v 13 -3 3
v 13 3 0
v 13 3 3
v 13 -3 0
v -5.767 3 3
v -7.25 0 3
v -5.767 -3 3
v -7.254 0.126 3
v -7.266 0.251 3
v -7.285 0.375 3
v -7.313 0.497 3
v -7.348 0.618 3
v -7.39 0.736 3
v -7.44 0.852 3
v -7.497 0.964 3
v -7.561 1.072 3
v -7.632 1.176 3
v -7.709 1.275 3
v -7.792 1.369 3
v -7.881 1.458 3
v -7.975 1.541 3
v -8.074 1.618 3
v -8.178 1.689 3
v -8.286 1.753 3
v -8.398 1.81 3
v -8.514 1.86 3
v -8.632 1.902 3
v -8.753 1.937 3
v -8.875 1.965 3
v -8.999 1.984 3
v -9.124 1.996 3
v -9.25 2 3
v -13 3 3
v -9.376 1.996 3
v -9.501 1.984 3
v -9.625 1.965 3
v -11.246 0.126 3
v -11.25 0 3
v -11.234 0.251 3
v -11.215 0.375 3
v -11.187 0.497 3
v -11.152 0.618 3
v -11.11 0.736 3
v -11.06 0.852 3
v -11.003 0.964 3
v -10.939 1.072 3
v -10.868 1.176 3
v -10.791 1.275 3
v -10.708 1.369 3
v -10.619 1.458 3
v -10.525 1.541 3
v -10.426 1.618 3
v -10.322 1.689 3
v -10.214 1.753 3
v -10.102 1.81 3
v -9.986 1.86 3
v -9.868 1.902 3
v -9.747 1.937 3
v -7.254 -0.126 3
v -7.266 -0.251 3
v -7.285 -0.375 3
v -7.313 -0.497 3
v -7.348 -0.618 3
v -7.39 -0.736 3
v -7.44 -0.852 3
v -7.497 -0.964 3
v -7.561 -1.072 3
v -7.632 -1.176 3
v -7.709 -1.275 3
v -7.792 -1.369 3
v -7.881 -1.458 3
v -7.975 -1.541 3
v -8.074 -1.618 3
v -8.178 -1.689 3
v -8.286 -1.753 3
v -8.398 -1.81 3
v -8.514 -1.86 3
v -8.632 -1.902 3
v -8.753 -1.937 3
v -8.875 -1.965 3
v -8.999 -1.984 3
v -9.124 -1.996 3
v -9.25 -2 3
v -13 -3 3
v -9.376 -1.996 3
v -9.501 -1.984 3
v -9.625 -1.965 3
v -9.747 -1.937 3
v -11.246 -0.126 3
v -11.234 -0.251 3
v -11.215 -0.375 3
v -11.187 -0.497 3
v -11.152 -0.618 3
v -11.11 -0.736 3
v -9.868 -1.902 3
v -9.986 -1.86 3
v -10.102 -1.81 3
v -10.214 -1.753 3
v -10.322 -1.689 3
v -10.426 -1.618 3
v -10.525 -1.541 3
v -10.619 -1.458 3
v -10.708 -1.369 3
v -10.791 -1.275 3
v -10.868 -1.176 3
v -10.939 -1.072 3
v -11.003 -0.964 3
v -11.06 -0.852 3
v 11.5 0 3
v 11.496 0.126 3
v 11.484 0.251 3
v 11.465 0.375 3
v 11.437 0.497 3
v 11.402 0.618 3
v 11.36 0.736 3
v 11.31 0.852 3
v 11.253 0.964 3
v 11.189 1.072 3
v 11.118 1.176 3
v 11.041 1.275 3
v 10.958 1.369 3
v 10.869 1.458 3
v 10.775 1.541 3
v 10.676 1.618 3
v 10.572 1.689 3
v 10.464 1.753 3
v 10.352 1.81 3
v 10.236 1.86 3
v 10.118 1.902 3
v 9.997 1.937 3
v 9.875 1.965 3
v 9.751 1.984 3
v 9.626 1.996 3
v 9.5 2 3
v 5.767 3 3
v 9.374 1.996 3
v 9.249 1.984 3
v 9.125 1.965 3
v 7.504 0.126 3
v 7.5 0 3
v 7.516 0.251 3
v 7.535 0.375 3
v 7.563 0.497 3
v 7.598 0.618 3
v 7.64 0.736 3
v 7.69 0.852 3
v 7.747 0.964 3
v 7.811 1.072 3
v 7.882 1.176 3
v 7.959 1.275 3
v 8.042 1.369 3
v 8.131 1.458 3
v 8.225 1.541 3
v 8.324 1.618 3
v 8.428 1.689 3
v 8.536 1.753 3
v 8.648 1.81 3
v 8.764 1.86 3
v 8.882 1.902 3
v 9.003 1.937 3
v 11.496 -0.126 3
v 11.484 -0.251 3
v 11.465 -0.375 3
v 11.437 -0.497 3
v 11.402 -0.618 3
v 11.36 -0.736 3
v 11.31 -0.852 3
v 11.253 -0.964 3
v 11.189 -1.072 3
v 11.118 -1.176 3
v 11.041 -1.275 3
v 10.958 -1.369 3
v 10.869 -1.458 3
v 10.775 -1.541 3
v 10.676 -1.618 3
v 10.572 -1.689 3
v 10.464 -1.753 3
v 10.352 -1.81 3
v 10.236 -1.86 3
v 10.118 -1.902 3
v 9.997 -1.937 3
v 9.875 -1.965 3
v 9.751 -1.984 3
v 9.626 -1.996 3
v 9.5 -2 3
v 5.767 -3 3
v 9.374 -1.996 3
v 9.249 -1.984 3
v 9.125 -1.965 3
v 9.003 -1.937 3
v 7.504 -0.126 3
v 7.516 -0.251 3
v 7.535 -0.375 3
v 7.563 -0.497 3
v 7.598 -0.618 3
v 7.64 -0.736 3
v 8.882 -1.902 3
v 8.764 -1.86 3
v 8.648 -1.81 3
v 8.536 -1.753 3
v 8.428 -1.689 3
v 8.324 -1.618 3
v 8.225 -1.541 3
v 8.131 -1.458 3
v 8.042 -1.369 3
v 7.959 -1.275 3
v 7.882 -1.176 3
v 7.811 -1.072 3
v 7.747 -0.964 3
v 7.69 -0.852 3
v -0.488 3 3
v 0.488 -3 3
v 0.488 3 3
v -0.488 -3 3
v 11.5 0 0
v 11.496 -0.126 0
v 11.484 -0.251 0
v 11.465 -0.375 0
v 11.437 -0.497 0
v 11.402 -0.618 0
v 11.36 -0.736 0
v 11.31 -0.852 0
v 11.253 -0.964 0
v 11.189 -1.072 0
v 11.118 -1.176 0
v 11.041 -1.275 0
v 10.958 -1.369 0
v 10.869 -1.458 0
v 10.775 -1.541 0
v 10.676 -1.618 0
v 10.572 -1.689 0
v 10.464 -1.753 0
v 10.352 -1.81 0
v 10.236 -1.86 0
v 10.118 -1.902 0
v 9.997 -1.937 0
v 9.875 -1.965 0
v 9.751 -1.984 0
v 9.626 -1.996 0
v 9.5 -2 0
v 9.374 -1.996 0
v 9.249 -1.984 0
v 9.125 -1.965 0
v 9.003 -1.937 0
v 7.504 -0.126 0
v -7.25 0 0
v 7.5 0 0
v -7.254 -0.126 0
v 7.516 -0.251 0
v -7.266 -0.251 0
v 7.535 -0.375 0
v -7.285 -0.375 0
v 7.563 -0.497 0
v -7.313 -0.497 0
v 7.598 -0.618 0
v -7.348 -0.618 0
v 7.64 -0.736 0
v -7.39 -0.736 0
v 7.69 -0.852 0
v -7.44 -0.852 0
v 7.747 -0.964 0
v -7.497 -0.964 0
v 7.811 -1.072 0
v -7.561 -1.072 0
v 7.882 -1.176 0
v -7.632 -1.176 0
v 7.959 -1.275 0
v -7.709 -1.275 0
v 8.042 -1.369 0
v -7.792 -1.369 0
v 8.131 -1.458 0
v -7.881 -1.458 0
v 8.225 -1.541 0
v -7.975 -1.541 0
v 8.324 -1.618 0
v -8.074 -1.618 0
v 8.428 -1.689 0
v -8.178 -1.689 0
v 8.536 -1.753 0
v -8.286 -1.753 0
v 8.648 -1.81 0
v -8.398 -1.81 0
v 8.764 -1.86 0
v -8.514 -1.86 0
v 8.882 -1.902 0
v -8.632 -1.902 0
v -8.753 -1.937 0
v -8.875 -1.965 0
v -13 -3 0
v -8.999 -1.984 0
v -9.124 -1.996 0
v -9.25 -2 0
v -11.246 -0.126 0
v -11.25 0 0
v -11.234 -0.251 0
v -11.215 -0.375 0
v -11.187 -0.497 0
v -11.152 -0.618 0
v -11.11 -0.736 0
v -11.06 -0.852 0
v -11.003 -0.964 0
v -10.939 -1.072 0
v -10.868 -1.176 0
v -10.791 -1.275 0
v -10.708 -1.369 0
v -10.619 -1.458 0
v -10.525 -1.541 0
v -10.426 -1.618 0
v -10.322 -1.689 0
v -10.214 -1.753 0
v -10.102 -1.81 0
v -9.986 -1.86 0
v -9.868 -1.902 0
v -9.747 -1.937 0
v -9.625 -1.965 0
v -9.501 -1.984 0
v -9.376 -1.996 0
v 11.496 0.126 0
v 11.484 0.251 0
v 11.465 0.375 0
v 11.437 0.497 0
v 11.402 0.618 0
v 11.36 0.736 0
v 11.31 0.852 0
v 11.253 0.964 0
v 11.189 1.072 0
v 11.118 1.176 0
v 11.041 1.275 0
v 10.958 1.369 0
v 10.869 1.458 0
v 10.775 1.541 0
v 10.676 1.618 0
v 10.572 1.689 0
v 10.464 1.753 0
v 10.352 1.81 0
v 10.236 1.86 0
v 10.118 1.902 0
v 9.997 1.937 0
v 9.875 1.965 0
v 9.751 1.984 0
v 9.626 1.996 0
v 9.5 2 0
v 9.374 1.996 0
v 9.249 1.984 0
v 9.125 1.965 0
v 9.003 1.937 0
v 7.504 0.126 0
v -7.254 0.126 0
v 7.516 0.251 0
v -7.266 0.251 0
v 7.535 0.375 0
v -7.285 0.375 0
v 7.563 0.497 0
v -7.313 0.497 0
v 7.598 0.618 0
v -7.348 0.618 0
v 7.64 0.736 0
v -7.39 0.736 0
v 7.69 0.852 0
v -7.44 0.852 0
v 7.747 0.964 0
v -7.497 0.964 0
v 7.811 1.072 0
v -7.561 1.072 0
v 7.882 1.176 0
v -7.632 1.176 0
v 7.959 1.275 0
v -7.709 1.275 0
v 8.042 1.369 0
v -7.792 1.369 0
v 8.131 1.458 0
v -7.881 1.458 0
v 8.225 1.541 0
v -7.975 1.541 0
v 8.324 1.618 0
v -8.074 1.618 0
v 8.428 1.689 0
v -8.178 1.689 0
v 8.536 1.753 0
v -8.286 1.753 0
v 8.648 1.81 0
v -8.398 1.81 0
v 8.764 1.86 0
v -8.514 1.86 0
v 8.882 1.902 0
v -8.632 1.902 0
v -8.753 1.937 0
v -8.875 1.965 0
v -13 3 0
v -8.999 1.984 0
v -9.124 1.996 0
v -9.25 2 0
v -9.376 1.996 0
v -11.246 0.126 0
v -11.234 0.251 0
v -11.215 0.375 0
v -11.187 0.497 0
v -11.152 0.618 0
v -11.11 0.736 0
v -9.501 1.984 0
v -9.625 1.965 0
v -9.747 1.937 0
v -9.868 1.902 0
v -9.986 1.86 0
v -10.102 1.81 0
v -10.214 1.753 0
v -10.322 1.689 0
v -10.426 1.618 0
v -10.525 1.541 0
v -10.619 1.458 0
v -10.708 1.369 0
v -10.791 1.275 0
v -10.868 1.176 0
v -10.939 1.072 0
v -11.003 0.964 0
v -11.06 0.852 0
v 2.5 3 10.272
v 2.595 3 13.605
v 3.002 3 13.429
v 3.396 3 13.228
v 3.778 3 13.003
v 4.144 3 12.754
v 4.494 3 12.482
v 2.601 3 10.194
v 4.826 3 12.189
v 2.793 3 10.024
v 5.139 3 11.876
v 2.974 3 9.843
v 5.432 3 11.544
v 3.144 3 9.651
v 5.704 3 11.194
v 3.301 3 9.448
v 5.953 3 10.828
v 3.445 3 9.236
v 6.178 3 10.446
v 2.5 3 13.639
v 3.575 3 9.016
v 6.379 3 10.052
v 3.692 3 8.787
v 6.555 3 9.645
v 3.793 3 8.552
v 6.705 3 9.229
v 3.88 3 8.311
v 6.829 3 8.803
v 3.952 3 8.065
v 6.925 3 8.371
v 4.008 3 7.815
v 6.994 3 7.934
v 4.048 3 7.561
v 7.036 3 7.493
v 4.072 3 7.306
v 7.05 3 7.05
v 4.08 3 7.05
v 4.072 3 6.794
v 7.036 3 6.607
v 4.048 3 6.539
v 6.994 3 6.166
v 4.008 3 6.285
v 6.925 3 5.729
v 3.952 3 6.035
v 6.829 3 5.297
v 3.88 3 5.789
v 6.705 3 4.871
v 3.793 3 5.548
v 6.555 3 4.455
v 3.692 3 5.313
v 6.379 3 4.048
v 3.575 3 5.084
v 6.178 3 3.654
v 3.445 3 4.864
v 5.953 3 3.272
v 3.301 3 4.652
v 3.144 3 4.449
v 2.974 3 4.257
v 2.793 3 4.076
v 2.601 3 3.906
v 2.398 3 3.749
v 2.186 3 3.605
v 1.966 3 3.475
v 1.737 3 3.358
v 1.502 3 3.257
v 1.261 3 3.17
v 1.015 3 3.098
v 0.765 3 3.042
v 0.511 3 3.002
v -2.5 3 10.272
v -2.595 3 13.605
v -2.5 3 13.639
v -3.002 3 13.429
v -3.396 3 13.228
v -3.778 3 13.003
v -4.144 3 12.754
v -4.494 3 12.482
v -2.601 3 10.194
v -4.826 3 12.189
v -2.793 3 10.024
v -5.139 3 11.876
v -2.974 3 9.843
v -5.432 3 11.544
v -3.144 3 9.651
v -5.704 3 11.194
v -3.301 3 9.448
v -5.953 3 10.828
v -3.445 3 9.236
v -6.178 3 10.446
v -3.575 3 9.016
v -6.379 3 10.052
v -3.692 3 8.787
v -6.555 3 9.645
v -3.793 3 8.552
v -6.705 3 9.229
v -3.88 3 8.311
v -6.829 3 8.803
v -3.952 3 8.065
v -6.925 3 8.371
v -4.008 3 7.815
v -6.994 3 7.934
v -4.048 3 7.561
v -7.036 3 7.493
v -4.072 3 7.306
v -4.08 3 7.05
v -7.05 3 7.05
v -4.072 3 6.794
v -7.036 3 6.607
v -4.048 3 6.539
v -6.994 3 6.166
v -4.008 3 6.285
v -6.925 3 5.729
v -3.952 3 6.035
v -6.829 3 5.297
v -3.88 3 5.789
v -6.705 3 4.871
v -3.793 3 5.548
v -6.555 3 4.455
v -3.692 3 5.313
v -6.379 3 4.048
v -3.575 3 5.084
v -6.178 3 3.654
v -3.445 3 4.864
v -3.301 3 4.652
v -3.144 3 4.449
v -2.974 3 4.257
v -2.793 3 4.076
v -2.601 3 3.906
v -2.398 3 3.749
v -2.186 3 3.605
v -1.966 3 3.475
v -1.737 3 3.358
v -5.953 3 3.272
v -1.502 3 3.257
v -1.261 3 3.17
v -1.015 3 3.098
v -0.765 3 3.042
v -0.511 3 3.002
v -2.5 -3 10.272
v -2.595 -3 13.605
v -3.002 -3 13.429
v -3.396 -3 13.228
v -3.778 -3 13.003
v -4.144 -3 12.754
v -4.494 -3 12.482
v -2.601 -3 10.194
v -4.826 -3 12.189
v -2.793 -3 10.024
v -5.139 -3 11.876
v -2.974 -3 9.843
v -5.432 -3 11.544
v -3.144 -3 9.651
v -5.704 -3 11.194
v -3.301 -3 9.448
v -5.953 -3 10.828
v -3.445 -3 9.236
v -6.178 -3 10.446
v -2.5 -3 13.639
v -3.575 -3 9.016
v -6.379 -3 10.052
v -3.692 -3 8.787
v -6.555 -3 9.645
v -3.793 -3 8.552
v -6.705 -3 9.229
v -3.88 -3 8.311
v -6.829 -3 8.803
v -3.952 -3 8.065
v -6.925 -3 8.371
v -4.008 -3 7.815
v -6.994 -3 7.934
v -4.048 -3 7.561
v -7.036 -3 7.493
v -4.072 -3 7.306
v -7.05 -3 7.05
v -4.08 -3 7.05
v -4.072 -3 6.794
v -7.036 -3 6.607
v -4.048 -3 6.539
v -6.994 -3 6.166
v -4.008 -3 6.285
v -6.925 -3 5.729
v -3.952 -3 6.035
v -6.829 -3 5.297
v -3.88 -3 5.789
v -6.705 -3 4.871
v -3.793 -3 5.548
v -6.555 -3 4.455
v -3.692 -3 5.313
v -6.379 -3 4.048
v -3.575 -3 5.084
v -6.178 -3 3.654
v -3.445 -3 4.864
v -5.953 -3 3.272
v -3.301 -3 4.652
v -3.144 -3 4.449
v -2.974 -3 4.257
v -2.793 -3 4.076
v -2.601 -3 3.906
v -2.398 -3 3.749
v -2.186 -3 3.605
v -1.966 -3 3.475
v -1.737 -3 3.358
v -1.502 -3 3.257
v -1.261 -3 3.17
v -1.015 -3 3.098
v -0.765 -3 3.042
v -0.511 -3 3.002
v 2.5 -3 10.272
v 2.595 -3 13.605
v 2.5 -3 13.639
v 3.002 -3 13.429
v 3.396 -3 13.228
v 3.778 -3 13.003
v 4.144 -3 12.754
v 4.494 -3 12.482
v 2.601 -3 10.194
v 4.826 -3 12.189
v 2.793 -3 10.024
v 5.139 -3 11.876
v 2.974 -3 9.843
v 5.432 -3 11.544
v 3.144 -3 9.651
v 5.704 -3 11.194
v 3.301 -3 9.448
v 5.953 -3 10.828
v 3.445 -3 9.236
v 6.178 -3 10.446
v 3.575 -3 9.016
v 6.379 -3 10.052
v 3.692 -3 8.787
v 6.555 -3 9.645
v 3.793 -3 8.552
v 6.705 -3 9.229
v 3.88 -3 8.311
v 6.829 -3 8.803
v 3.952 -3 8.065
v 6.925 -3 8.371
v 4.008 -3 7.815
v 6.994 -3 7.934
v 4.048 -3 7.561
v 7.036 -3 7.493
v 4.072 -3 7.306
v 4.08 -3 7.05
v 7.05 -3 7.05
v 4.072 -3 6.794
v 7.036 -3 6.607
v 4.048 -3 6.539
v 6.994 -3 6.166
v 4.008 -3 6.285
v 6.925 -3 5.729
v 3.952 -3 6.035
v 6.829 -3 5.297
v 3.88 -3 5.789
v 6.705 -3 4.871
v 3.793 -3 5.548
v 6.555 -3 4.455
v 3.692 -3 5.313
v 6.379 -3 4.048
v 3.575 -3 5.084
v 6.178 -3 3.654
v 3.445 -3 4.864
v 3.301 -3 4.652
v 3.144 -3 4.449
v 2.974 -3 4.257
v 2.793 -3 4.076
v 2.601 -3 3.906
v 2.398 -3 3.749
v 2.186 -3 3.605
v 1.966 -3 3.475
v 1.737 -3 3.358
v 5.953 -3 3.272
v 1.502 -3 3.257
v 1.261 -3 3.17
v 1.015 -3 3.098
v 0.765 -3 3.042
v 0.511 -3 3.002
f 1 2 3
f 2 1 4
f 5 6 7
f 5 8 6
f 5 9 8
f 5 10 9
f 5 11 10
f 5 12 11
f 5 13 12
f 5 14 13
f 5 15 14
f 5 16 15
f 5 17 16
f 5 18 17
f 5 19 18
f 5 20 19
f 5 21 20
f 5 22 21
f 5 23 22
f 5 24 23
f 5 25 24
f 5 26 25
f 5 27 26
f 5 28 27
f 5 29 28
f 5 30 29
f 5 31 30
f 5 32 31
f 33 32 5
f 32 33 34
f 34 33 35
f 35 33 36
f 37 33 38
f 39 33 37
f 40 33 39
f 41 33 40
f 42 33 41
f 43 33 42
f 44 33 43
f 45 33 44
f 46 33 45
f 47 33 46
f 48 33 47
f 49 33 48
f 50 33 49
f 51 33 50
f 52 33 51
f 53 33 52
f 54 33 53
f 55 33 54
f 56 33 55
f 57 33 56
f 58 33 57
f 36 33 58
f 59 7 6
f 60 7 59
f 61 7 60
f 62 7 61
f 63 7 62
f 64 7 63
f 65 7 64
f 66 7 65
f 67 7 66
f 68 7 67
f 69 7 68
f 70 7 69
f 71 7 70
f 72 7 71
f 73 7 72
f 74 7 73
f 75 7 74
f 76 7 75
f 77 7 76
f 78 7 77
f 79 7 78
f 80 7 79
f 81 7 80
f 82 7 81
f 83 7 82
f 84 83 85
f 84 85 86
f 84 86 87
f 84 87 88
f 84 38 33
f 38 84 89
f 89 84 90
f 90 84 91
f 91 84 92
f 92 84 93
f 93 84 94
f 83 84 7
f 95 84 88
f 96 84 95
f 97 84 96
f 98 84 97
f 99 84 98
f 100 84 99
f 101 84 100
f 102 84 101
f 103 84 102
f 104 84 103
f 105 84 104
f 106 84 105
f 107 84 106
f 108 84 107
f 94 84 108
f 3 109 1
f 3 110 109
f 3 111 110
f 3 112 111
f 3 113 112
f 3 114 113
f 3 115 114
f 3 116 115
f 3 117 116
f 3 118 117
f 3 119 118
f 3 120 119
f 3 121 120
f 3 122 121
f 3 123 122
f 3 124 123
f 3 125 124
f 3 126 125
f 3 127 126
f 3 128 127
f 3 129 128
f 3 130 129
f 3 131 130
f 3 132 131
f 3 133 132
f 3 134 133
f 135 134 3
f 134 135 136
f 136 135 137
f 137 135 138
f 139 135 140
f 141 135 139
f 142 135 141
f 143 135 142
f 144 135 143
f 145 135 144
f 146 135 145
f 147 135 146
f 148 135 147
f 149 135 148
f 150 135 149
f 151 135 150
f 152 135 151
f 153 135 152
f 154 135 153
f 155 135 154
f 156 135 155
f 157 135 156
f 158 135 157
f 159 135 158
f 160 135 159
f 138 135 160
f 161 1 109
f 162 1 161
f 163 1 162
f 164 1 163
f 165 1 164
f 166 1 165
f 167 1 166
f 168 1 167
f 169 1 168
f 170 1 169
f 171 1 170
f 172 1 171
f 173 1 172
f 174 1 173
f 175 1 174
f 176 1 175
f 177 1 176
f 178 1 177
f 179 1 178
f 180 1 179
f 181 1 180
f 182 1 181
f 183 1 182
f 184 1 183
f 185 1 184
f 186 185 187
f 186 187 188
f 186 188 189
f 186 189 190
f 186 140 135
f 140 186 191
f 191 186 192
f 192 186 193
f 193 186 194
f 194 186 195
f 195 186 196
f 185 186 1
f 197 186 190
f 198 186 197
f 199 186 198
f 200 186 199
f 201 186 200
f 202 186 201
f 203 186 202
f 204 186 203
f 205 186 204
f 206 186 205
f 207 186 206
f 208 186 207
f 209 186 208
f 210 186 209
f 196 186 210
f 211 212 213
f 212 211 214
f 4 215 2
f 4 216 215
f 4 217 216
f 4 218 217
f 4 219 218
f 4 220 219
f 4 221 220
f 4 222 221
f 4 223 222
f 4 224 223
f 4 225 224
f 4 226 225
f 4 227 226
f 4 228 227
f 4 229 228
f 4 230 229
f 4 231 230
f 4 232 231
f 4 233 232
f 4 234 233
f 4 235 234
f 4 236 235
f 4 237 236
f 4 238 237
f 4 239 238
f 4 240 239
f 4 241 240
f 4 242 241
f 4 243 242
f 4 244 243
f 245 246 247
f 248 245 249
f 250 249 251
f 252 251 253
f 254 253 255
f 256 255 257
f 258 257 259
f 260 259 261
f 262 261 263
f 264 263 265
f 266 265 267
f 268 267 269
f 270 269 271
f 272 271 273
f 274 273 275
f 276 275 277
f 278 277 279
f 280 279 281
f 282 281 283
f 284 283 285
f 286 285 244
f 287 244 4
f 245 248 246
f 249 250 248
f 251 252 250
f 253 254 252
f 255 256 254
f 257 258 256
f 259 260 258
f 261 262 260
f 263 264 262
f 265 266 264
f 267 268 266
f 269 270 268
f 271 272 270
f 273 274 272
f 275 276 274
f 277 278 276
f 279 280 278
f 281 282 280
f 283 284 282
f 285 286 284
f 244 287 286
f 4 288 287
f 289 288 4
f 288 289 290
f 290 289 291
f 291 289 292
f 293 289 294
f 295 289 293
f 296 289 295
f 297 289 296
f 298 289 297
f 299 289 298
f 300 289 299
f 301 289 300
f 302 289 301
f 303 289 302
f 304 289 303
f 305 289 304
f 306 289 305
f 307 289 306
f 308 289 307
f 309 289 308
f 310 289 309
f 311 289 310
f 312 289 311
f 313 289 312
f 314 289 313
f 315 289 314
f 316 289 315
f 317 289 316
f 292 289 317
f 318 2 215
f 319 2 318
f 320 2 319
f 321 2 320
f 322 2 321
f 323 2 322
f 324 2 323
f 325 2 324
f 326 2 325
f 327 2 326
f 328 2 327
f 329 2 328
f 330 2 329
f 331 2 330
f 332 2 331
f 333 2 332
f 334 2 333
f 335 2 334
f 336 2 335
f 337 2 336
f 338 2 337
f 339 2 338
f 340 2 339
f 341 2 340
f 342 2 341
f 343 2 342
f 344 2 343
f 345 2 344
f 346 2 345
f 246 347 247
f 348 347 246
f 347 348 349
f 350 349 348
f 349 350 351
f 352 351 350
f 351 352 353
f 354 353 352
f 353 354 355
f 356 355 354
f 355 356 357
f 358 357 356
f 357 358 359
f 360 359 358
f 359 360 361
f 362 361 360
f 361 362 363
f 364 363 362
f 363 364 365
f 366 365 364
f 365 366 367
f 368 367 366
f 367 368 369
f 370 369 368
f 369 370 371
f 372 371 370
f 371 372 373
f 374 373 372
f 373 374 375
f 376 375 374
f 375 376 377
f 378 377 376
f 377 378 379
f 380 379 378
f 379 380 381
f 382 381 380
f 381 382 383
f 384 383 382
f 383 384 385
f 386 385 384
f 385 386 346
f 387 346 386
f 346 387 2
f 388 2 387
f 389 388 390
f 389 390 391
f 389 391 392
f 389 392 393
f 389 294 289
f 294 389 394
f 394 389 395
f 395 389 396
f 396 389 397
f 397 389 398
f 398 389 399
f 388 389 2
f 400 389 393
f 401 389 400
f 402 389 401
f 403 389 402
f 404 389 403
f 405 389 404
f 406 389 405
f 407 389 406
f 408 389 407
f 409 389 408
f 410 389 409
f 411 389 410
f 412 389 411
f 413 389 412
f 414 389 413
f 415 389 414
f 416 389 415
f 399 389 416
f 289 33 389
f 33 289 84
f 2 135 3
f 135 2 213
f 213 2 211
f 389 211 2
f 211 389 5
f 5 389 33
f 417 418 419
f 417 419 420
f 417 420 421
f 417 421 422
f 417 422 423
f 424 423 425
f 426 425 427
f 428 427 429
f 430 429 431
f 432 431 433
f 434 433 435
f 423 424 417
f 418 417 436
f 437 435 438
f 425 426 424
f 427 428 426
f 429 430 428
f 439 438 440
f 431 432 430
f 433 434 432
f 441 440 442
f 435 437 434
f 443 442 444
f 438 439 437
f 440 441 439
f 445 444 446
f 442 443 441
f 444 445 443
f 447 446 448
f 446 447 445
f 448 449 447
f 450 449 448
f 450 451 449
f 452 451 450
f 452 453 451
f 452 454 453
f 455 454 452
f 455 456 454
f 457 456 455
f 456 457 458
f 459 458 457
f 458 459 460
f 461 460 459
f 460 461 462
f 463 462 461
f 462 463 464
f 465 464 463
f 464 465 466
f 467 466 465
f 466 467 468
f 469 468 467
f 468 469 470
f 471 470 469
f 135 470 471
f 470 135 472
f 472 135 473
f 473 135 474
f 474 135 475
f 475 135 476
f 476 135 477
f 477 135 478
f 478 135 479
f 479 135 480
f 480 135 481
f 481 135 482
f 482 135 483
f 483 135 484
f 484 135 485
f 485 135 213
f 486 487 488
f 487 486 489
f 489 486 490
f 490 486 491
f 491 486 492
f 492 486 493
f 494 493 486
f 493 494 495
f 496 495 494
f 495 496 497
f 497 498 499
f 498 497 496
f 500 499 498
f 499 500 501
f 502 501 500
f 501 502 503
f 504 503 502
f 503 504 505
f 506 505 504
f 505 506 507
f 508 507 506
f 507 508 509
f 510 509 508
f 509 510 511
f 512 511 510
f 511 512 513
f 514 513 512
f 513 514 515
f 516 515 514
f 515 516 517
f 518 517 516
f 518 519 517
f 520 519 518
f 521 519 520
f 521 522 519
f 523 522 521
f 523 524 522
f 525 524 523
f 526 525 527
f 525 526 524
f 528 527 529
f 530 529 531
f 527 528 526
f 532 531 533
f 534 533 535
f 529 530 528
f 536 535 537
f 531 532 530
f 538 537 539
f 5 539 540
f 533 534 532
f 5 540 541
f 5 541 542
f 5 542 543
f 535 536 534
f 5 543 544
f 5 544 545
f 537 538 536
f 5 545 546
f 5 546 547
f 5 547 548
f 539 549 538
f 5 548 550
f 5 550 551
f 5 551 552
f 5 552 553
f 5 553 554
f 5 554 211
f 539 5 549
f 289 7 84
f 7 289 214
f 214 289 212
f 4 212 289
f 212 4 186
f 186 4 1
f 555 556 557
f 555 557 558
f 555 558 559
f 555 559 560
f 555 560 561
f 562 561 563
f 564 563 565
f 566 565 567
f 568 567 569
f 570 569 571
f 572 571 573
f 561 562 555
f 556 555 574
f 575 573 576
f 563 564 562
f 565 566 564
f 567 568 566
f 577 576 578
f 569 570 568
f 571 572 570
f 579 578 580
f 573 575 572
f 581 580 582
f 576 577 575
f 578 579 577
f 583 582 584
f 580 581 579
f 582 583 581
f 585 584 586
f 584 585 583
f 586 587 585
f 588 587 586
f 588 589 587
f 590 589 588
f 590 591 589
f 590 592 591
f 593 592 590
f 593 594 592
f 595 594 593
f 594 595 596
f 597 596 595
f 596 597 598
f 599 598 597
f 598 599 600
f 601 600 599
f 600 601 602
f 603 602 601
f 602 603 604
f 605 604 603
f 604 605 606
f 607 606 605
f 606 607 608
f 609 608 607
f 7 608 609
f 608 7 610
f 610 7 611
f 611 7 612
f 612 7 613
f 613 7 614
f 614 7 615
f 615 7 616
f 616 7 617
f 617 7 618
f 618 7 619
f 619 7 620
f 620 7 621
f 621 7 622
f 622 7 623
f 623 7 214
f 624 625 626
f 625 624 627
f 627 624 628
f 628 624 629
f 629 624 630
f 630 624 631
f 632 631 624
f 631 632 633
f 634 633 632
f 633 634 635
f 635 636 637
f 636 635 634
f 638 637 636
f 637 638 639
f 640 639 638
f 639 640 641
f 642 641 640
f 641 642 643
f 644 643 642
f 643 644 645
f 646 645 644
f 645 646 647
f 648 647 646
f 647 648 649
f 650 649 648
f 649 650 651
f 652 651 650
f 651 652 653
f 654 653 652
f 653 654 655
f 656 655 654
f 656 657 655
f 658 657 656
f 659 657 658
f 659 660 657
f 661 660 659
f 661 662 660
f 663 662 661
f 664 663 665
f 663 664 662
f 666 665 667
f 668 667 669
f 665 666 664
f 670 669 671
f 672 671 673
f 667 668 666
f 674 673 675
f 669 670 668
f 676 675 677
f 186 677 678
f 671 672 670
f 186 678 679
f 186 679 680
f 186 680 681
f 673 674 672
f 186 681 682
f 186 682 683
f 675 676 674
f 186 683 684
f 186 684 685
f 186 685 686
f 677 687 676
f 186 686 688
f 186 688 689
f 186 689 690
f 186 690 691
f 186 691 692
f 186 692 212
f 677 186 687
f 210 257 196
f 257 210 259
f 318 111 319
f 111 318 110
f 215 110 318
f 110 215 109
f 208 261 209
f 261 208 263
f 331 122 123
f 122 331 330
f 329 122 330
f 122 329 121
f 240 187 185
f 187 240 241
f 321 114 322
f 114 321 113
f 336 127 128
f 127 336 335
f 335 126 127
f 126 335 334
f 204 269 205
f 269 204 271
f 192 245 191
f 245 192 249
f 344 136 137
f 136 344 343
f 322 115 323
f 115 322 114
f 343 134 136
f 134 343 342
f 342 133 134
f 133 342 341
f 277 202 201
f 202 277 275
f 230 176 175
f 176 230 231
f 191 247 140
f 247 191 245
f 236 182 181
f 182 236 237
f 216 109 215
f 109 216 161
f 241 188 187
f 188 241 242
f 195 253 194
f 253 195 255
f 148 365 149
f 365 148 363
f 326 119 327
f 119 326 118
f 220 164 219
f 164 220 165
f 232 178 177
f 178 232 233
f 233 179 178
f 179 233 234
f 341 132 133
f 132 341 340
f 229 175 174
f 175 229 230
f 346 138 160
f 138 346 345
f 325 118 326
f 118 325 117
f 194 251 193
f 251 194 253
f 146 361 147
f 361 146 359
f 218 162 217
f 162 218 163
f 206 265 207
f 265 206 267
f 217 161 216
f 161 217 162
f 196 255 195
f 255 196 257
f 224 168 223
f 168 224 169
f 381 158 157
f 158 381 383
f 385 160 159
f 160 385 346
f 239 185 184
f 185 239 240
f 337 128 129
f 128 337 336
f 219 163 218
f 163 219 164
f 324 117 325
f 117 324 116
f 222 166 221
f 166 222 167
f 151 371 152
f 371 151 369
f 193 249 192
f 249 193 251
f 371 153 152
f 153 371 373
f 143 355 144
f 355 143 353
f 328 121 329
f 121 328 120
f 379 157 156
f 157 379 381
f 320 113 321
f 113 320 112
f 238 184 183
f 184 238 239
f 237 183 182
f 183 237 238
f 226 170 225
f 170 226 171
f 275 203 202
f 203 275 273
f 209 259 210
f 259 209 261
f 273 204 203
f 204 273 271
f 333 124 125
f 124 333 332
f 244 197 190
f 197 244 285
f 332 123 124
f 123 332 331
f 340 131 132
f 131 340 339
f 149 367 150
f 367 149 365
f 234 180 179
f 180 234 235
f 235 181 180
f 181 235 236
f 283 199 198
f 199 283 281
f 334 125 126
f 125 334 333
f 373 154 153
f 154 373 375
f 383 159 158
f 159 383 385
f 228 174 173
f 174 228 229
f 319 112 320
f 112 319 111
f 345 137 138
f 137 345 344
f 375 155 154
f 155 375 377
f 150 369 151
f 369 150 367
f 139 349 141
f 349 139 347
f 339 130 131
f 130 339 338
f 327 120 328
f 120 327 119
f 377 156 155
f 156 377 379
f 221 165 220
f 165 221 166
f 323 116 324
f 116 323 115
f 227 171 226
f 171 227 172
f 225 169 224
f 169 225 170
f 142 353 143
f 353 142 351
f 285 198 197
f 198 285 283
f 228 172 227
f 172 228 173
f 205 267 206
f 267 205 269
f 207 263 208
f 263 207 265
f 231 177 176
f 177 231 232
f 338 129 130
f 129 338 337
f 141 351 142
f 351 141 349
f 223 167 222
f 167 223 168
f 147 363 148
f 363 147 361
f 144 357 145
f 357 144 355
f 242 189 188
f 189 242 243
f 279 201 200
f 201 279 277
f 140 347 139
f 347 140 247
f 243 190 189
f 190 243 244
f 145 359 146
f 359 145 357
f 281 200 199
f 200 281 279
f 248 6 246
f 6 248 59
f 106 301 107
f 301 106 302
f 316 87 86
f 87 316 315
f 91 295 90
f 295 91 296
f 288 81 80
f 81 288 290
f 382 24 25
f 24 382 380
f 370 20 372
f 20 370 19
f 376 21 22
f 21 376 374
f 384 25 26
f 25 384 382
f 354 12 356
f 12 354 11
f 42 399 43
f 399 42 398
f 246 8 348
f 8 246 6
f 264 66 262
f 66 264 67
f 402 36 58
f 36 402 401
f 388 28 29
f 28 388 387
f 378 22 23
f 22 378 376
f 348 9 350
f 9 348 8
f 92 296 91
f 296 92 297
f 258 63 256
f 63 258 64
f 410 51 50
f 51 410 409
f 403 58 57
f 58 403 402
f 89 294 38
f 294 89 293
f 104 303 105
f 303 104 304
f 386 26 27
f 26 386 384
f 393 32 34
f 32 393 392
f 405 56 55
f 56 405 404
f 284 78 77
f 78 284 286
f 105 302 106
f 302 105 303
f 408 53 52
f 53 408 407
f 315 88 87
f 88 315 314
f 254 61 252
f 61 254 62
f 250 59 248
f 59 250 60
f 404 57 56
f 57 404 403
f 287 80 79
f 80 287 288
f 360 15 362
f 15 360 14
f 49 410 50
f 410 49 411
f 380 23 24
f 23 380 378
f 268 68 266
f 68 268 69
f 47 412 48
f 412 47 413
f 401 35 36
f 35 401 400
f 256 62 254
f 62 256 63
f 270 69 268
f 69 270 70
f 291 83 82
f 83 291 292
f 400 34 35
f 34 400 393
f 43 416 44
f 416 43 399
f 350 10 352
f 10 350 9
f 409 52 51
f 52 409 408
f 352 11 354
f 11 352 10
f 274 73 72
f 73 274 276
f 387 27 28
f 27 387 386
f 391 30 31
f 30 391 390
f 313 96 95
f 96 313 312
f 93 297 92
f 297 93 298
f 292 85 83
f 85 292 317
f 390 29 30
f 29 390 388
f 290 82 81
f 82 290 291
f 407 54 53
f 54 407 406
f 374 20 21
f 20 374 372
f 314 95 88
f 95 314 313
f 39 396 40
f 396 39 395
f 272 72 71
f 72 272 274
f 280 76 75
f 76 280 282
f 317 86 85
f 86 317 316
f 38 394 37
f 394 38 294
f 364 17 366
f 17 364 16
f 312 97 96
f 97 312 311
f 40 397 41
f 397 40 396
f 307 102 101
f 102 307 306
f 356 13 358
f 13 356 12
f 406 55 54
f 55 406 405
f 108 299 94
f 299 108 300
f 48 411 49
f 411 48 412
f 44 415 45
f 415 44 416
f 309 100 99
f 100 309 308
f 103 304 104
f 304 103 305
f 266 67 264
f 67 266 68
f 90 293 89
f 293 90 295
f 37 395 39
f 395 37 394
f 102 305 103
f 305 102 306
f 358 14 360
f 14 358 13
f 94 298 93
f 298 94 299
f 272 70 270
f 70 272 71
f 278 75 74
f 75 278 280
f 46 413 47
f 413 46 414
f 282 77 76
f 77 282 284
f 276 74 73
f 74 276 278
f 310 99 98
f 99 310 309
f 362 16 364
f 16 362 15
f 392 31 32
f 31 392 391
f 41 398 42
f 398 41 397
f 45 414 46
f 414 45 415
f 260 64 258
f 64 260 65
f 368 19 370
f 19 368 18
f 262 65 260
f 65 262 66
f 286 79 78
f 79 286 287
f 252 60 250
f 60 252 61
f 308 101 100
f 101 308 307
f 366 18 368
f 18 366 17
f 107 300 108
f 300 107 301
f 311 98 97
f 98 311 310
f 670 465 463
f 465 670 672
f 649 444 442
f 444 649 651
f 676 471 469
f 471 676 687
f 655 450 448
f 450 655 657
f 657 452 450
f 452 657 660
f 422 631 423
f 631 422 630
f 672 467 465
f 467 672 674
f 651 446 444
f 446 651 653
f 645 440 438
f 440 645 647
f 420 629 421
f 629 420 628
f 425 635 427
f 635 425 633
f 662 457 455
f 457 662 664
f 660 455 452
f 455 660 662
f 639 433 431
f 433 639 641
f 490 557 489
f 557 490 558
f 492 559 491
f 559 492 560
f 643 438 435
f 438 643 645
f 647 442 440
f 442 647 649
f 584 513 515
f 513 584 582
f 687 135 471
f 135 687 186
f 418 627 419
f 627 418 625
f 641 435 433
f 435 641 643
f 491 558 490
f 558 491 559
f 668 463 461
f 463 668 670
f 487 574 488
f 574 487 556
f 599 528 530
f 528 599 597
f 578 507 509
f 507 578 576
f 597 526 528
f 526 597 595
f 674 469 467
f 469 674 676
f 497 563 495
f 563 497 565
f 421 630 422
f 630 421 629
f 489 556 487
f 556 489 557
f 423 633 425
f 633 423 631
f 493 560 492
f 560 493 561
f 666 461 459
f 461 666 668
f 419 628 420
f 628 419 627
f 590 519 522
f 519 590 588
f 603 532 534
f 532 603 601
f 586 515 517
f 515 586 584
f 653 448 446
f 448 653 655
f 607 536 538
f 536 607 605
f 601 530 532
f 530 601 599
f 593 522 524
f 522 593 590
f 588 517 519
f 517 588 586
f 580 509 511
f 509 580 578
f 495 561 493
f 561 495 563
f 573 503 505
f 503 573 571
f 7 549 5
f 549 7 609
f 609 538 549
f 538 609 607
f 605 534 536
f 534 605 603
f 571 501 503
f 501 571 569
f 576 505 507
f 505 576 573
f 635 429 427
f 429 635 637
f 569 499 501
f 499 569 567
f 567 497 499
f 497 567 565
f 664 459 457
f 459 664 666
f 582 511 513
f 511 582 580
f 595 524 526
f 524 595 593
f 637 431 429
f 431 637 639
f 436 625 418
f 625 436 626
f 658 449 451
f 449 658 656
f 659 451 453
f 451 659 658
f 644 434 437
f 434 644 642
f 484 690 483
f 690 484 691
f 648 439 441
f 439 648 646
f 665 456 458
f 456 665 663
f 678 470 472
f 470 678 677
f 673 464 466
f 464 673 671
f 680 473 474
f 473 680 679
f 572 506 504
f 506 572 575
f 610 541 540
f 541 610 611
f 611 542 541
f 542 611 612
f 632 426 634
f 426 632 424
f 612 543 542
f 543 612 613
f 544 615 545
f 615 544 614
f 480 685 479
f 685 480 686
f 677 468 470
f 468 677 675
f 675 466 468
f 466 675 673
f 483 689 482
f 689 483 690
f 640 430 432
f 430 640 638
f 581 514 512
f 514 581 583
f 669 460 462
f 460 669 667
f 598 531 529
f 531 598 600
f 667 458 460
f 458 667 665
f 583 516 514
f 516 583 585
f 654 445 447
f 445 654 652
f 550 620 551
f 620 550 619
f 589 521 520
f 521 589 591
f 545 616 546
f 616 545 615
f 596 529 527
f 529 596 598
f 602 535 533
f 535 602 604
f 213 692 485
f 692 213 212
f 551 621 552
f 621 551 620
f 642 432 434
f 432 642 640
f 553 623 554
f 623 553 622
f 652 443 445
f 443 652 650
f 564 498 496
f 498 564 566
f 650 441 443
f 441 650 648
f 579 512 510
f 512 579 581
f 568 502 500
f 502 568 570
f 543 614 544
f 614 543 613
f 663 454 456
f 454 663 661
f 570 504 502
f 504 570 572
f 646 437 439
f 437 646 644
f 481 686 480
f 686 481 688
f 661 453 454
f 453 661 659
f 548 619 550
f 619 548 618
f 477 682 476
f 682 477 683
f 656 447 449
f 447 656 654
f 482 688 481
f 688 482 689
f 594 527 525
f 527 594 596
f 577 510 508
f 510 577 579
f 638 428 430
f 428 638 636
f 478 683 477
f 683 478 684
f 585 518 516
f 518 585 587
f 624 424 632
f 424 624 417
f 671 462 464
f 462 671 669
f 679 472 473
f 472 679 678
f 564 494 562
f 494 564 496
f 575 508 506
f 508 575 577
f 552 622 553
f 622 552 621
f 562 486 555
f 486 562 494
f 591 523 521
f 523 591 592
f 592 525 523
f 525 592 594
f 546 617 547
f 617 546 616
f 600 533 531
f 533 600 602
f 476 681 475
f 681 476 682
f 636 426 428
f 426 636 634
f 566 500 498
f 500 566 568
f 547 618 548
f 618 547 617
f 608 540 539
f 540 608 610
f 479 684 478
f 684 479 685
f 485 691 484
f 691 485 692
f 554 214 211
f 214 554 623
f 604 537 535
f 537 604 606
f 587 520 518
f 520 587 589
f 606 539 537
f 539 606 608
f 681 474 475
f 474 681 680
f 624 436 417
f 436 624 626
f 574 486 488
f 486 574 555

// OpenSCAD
//---------------------------------------------------------------
//--  Eje X final de carrera.  (c) Antonio Castro Gómez
//---------------------------------------------------------------
//-- Released under the GPL license
//---------------------------------------------------------------


difference()
{
	translate([0,0,1.5])cube(size=[26,6,3], center=true);
	//translate([0,0,1])cube(size=[13,9,4], center=true);

	translate([9.5,0,-1])cylinder(h=10, r=2, $fn=100);

	translate([-9.25,0,-1])cylinder(h=10, r=2, $fn=100);
}
difference()
{

  translate([0,3,7.05])rotate([90,0,0])cylinder(h=6, r=7.05, $fn=100);
  translate([0,5,7.05])rotate([90,0,0])cylinder(h=10, r=4.08, $fn=100);
  translate([0,0,11])cube(size=[5,8,10], center=true);	
}
